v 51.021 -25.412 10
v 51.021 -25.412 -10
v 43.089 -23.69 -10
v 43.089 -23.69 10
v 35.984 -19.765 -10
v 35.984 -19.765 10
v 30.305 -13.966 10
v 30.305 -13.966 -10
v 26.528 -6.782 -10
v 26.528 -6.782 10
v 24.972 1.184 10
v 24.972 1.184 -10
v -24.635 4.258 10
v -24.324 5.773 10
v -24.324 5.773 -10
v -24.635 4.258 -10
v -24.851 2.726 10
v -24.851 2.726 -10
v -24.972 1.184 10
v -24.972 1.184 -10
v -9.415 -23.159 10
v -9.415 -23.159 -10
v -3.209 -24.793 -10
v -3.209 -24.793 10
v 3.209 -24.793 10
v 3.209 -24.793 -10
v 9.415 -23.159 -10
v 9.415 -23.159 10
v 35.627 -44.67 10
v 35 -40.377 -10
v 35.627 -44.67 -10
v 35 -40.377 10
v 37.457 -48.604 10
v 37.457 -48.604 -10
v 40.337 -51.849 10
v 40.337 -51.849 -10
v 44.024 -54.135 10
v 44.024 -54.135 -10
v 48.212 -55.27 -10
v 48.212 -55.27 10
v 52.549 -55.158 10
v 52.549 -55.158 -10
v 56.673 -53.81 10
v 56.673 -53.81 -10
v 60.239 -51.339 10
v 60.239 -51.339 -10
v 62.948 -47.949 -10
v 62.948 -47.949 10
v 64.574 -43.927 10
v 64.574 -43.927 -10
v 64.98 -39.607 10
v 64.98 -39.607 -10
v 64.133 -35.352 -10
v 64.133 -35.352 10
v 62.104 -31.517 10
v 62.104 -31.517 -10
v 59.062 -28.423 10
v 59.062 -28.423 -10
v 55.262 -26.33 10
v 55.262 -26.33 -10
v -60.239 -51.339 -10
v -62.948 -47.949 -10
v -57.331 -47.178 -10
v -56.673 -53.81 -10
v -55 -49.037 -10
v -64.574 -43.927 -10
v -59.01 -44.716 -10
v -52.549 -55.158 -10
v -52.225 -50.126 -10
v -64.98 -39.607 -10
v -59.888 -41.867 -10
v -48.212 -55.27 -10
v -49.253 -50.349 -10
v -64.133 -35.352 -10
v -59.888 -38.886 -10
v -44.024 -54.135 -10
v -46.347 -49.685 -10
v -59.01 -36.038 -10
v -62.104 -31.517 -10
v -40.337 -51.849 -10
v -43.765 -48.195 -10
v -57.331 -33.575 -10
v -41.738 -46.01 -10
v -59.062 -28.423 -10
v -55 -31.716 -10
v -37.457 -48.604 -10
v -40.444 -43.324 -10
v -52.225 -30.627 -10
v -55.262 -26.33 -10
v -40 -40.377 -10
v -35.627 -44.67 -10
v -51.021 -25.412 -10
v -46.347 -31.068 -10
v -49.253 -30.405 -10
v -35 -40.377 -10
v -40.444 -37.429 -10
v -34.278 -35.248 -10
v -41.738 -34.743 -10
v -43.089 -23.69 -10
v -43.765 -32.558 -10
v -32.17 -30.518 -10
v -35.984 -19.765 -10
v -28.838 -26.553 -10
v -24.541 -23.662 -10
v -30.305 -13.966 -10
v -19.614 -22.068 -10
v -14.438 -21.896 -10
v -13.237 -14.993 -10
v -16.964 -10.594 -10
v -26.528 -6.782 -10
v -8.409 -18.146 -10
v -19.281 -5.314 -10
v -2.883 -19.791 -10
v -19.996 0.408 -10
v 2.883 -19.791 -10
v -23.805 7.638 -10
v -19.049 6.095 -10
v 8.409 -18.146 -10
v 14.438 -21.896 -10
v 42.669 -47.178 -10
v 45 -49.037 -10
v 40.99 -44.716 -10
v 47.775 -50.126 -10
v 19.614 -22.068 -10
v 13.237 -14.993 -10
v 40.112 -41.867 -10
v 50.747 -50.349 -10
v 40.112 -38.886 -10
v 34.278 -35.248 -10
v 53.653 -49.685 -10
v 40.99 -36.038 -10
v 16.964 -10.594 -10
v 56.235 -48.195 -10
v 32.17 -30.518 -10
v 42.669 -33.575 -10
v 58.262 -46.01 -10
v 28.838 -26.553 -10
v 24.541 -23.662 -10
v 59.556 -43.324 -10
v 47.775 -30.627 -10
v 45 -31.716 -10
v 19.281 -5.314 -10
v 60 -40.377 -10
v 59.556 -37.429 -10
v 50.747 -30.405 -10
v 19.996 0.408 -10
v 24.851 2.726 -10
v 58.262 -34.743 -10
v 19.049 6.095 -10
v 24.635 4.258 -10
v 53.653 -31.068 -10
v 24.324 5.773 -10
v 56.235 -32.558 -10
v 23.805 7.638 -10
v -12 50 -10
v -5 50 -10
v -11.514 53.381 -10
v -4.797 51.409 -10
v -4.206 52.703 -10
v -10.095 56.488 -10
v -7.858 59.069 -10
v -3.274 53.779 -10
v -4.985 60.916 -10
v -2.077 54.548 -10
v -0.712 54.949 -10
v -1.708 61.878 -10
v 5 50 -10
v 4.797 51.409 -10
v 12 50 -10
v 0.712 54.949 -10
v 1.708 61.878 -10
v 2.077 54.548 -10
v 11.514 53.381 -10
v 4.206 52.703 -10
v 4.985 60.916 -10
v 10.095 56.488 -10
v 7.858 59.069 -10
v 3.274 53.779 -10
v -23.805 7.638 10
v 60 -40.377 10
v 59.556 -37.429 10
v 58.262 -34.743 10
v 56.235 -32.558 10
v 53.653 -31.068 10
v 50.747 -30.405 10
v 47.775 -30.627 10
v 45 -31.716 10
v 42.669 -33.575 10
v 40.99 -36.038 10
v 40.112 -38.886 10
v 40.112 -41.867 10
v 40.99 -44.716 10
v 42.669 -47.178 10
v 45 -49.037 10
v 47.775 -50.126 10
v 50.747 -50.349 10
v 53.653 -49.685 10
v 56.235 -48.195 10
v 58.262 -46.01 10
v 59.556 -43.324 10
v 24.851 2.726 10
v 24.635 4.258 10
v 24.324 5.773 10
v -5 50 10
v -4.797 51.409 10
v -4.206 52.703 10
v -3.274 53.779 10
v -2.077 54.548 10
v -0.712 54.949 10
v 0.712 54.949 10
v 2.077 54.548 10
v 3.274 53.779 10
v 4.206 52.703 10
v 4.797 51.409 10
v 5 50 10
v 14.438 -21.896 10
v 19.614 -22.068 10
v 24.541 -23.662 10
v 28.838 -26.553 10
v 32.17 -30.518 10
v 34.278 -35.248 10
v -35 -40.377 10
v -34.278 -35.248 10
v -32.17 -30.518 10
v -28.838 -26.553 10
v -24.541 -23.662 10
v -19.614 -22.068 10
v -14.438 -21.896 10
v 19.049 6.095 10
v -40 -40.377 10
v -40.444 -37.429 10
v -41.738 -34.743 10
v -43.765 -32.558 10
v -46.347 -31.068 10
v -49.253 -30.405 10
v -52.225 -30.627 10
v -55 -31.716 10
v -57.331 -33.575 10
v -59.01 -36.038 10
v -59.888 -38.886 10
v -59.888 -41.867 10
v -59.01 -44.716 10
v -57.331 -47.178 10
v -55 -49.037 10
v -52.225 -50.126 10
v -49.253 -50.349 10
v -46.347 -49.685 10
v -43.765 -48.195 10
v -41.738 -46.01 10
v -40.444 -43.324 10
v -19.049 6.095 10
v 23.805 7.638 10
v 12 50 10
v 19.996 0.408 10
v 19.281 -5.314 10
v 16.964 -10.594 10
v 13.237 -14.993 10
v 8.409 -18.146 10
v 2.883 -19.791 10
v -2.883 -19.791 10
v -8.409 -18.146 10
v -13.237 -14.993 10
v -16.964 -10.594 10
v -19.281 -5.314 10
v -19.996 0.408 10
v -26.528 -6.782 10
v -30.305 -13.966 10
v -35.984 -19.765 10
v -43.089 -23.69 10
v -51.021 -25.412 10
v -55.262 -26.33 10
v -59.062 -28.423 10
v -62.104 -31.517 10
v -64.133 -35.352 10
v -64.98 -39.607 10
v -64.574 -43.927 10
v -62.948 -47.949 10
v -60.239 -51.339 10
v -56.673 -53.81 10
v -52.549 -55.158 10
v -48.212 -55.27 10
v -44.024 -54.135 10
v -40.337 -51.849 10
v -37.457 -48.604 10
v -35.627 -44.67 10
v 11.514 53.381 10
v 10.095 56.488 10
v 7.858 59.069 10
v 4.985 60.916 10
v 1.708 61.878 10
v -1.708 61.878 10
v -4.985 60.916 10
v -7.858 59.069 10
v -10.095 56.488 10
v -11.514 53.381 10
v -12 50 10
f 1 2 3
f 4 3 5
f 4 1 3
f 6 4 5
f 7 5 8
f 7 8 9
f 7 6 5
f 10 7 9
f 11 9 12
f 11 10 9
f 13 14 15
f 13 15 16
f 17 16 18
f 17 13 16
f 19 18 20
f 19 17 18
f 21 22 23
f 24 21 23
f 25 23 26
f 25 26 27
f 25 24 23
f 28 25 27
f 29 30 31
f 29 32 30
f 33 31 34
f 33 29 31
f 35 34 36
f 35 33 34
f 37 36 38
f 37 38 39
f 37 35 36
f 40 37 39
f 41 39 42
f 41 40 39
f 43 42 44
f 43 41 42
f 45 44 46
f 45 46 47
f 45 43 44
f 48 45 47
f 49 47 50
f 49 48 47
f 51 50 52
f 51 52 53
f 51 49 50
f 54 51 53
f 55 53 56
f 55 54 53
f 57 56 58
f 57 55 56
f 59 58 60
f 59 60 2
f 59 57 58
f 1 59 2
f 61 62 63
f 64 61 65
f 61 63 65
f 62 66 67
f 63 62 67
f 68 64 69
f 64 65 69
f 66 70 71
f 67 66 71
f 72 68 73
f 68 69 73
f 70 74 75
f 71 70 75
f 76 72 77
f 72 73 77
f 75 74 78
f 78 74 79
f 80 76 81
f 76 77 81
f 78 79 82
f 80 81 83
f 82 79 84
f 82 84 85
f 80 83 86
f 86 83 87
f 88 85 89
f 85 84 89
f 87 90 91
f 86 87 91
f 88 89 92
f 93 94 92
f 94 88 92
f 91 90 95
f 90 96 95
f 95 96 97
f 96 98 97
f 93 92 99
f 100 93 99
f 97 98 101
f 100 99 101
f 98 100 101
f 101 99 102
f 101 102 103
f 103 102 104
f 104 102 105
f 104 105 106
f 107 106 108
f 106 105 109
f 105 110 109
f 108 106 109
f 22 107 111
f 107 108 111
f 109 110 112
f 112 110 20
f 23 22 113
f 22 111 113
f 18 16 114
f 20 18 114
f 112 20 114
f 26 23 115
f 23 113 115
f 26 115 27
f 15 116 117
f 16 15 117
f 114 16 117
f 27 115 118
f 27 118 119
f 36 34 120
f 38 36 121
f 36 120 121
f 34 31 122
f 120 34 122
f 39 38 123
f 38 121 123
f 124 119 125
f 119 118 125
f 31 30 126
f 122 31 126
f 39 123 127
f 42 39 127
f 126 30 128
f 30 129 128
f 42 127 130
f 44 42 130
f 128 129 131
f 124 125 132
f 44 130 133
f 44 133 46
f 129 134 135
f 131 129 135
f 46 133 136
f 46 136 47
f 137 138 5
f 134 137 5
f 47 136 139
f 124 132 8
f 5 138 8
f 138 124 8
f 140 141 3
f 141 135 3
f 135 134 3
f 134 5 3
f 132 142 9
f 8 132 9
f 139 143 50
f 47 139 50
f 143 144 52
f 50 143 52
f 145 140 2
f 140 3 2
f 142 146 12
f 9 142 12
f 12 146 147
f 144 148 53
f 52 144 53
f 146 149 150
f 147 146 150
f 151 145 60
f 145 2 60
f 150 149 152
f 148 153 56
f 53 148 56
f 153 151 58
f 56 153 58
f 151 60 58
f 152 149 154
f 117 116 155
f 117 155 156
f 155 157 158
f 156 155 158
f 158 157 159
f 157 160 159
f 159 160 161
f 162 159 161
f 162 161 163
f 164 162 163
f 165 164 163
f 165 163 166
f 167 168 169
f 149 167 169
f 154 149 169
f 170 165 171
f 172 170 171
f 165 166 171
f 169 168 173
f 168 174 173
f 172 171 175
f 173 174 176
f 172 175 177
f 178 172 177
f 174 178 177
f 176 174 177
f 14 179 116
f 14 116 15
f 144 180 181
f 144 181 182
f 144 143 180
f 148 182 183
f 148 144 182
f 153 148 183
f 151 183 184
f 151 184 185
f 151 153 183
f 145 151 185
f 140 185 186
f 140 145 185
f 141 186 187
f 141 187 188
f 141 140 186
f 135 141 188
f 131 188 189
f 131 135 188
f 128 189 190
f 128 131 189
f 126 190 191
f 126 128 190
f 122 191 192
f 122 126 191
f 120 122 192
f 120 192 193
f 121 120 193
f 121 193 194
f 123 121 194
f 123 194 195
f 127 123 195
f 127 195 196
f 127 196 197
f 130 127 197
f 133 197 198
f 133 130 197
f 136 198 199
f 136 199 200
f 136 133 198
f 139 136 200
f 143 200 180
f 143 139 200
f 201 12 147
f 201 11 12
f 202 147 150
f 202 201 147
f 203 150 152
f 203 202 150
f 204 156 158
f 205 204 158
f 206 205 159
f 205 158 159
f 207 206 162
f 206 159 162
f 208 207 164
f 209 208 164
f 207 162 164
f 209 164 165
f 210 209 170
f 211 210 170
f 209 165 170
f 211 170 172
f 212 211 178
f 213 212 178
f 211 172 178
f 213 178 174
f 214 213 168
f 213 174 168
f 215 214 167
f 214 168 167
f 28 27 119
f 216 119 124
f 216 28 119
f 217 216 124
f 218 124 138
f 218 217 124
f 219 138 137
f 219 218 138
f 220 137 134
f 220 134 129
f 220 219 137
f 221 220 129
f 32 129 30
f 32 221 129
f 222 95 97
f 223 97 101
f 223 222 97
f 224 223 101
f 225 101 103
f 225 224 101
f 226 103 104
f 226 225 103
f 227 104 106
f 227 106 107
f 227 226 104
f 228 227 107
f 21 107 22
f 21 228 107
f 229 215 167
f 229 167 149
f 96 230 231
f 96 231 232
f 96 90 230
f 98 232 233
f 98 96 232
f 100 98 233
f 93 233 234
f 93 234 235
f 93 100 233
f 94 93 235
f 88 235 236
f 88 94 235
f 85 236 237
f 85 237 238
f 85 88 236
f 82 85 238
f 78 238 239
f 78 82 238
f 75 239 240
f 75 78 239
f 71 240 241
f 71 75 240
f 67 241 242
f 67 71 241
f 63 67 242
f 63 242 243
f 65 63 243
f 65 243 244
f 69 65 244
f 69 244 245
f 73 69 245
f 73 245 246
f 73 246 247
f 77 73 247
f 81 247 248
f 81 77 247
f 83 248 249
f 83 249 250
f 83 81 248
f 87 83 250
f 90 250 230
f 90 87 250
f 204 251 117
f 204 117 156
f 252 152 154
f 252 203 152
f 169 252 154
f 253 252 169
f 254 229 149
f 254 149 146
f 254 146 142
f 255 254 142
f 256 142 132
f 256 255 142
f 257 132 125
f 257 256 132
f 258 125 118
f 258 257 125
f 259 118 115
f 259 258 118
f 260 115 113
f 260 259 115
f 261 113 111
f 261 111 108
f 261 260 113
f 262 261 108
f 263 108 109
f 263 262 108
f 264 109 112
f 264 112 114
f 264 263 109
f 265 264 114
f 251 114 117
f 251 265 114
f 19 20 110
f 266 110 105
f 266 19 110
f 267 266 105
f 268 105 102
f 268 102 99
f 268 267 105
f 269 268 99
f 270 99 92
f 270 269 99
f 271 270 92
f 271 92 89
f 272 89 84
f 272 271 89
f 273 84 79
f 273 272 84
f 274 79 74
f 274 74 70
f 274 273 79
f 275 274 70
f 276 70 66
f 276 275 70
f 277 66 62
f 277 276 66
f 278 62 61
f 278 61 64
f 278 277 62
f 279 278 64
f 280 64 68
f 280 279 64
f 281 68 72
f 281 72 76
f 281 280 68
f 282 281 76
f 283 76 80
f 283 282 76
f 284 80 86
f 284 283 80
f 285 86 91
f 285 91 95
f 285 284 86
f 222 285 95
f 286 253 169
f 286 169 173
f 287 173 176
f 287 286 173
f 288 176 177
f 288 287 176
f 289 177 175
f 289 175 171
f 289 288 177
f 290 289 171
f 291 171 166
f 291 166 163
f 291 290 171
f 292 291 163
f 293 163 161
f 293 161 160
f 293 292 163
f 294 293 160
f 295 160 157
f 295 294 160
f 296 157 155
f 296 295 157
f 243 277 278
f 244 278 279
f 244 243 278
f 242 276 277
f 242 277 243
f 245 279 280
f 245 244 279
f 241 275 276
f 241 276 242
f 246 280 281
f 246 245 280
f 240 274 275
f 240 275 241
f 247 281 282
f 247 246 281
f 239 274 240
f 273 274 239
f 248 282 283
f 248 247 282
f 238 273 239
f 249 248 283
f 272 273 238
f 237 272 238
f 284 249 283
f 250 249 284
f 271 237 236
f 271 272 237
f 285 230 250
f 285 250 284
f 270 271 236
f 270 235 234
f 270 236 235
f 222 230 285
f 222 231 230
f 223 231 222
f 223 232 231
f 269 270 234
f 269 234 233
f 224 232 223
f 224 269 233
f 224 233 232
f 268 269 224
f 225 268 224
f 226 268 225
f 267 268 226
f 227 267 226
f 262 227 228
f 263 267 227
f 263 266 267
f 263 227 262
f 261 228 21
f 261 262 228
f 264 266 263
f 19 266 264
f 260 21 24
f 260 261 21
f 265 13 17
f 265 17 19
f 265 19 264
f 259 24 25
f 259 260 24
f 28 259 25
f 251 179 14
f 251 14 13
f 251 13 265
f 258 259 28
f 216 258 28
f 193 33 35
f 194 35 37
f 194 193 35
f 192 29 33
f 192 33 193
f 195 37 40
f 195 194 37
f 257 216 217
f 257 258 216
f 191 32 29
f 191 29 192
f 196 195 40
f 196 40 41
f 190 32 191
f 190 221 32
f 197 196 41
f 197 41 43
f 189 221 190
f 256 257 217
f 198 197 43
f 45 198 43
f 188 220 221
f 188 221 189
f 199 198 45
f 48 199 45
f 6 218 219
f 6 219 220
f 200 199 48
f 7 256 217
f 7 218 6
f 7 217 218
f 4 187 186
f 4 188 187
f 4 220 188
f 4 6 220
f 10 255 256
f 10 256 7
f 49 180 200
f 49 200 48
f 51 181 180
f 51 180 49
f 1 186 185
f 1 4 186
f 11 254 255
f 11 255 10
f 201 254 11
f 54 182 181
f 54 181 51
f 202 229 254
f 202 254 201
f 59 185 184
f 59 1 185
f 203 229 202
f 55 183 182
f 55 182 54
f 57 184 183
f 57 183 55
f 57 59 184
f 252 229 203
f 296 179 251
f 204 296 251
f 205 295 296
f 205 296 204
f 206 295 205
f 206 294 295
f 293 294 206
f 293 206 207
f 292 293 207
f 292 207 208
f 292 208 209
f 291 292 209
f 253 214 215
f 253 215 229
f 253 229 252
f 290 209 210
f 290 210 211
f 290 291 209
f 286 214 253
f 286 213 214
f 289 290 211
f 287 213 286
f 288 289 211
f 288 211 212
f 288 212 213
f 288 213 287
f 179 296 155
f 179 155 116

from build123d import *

# Parameters (mm, degrees)
SKETCH1_R           = 10
BOSS_EXTRUDE1_DEPTH = 10


with BuildPart() as part:
    # Sketch1 → Boss-Extrude1 (new, symmetric)
    with BuildSketch(Plane.XY):
        with BuildLine():
            Line((23.804506832, 7.638419634), (12, 50))
            ThreePointArc((12, 50), (0, 62), (-12, 50))
            Line((-12, 50), (-23.804506832, 7.638419634))
            Line((-23.804506832, 7.638419634), (-24.324275855, 5.773179723))
            ThreePointArc((-24.324275855, 5.773179723), (-24.754655731, 3.49385455), (-24.971925744, 1.184451201))
            ThreePointArc((-24.971925744, 1.184451201), (-32.933355329, -17.072864969), (-51.021497025, -25.411515024))
            ThreePointArc((-51.021497025, -25.411515024), (-60.239080638, -51.338500415), (-35, -40.376692732))
            ThreePointArc((-35, -40.376692732), (-26.790738996, -24.957326865), (-9.41500118, -23.1593988))
            ThreePointArc((-9.41500118, -23.1593988), (0, -25), (9.41500118, -23.1593988))
            ThreePointArc((9.41500118, -23.1593988), (26.790738996, -24.957326865), (35, -40.376692732))
            ThreePointArc((35, -40.376692732), (60.239080638, -51.338500415), (51.021497025, -25.411515024))
            ThreePointArc((51.021497025, -25.411515024), (32.933355329, -17.072864969), (24.971925744, 1.184451201))
            ThreePointArc((24.971925744, 1.184451201), (24.754655731, 3.49385455), (24.324275855, 5.773179723))
            Line((24.324275855, 5.773179723), (23.804506832, 7.638419634))
        make_face()
        with Locations((-50, -40.376692732)):
            Circle(SKETCH1_R, mode=Mode.SUBTRACT)
        with Locations((50, -40.376692732)):
            Circle(SKETCH1_R, mode=Mode.SUBTRACT)
        with BuildLine():
            ThreePointArc((-5, 50), (0, 55), (5, 50))
            Line((5, 50), (19.048602886, 6.095139711))
            ThreePointArc((19.048602886, 6.095139711), (0, -20), (-19.048602886, 6.095139711))
            Line((-19.048602886, 6.095139711), (-5, 50))
        make_face(mode=Mode.SUBTRACT)
    extrude(amount=BOSS_EXTRUDE1_DEPTH, both=True)


solid = part.part
